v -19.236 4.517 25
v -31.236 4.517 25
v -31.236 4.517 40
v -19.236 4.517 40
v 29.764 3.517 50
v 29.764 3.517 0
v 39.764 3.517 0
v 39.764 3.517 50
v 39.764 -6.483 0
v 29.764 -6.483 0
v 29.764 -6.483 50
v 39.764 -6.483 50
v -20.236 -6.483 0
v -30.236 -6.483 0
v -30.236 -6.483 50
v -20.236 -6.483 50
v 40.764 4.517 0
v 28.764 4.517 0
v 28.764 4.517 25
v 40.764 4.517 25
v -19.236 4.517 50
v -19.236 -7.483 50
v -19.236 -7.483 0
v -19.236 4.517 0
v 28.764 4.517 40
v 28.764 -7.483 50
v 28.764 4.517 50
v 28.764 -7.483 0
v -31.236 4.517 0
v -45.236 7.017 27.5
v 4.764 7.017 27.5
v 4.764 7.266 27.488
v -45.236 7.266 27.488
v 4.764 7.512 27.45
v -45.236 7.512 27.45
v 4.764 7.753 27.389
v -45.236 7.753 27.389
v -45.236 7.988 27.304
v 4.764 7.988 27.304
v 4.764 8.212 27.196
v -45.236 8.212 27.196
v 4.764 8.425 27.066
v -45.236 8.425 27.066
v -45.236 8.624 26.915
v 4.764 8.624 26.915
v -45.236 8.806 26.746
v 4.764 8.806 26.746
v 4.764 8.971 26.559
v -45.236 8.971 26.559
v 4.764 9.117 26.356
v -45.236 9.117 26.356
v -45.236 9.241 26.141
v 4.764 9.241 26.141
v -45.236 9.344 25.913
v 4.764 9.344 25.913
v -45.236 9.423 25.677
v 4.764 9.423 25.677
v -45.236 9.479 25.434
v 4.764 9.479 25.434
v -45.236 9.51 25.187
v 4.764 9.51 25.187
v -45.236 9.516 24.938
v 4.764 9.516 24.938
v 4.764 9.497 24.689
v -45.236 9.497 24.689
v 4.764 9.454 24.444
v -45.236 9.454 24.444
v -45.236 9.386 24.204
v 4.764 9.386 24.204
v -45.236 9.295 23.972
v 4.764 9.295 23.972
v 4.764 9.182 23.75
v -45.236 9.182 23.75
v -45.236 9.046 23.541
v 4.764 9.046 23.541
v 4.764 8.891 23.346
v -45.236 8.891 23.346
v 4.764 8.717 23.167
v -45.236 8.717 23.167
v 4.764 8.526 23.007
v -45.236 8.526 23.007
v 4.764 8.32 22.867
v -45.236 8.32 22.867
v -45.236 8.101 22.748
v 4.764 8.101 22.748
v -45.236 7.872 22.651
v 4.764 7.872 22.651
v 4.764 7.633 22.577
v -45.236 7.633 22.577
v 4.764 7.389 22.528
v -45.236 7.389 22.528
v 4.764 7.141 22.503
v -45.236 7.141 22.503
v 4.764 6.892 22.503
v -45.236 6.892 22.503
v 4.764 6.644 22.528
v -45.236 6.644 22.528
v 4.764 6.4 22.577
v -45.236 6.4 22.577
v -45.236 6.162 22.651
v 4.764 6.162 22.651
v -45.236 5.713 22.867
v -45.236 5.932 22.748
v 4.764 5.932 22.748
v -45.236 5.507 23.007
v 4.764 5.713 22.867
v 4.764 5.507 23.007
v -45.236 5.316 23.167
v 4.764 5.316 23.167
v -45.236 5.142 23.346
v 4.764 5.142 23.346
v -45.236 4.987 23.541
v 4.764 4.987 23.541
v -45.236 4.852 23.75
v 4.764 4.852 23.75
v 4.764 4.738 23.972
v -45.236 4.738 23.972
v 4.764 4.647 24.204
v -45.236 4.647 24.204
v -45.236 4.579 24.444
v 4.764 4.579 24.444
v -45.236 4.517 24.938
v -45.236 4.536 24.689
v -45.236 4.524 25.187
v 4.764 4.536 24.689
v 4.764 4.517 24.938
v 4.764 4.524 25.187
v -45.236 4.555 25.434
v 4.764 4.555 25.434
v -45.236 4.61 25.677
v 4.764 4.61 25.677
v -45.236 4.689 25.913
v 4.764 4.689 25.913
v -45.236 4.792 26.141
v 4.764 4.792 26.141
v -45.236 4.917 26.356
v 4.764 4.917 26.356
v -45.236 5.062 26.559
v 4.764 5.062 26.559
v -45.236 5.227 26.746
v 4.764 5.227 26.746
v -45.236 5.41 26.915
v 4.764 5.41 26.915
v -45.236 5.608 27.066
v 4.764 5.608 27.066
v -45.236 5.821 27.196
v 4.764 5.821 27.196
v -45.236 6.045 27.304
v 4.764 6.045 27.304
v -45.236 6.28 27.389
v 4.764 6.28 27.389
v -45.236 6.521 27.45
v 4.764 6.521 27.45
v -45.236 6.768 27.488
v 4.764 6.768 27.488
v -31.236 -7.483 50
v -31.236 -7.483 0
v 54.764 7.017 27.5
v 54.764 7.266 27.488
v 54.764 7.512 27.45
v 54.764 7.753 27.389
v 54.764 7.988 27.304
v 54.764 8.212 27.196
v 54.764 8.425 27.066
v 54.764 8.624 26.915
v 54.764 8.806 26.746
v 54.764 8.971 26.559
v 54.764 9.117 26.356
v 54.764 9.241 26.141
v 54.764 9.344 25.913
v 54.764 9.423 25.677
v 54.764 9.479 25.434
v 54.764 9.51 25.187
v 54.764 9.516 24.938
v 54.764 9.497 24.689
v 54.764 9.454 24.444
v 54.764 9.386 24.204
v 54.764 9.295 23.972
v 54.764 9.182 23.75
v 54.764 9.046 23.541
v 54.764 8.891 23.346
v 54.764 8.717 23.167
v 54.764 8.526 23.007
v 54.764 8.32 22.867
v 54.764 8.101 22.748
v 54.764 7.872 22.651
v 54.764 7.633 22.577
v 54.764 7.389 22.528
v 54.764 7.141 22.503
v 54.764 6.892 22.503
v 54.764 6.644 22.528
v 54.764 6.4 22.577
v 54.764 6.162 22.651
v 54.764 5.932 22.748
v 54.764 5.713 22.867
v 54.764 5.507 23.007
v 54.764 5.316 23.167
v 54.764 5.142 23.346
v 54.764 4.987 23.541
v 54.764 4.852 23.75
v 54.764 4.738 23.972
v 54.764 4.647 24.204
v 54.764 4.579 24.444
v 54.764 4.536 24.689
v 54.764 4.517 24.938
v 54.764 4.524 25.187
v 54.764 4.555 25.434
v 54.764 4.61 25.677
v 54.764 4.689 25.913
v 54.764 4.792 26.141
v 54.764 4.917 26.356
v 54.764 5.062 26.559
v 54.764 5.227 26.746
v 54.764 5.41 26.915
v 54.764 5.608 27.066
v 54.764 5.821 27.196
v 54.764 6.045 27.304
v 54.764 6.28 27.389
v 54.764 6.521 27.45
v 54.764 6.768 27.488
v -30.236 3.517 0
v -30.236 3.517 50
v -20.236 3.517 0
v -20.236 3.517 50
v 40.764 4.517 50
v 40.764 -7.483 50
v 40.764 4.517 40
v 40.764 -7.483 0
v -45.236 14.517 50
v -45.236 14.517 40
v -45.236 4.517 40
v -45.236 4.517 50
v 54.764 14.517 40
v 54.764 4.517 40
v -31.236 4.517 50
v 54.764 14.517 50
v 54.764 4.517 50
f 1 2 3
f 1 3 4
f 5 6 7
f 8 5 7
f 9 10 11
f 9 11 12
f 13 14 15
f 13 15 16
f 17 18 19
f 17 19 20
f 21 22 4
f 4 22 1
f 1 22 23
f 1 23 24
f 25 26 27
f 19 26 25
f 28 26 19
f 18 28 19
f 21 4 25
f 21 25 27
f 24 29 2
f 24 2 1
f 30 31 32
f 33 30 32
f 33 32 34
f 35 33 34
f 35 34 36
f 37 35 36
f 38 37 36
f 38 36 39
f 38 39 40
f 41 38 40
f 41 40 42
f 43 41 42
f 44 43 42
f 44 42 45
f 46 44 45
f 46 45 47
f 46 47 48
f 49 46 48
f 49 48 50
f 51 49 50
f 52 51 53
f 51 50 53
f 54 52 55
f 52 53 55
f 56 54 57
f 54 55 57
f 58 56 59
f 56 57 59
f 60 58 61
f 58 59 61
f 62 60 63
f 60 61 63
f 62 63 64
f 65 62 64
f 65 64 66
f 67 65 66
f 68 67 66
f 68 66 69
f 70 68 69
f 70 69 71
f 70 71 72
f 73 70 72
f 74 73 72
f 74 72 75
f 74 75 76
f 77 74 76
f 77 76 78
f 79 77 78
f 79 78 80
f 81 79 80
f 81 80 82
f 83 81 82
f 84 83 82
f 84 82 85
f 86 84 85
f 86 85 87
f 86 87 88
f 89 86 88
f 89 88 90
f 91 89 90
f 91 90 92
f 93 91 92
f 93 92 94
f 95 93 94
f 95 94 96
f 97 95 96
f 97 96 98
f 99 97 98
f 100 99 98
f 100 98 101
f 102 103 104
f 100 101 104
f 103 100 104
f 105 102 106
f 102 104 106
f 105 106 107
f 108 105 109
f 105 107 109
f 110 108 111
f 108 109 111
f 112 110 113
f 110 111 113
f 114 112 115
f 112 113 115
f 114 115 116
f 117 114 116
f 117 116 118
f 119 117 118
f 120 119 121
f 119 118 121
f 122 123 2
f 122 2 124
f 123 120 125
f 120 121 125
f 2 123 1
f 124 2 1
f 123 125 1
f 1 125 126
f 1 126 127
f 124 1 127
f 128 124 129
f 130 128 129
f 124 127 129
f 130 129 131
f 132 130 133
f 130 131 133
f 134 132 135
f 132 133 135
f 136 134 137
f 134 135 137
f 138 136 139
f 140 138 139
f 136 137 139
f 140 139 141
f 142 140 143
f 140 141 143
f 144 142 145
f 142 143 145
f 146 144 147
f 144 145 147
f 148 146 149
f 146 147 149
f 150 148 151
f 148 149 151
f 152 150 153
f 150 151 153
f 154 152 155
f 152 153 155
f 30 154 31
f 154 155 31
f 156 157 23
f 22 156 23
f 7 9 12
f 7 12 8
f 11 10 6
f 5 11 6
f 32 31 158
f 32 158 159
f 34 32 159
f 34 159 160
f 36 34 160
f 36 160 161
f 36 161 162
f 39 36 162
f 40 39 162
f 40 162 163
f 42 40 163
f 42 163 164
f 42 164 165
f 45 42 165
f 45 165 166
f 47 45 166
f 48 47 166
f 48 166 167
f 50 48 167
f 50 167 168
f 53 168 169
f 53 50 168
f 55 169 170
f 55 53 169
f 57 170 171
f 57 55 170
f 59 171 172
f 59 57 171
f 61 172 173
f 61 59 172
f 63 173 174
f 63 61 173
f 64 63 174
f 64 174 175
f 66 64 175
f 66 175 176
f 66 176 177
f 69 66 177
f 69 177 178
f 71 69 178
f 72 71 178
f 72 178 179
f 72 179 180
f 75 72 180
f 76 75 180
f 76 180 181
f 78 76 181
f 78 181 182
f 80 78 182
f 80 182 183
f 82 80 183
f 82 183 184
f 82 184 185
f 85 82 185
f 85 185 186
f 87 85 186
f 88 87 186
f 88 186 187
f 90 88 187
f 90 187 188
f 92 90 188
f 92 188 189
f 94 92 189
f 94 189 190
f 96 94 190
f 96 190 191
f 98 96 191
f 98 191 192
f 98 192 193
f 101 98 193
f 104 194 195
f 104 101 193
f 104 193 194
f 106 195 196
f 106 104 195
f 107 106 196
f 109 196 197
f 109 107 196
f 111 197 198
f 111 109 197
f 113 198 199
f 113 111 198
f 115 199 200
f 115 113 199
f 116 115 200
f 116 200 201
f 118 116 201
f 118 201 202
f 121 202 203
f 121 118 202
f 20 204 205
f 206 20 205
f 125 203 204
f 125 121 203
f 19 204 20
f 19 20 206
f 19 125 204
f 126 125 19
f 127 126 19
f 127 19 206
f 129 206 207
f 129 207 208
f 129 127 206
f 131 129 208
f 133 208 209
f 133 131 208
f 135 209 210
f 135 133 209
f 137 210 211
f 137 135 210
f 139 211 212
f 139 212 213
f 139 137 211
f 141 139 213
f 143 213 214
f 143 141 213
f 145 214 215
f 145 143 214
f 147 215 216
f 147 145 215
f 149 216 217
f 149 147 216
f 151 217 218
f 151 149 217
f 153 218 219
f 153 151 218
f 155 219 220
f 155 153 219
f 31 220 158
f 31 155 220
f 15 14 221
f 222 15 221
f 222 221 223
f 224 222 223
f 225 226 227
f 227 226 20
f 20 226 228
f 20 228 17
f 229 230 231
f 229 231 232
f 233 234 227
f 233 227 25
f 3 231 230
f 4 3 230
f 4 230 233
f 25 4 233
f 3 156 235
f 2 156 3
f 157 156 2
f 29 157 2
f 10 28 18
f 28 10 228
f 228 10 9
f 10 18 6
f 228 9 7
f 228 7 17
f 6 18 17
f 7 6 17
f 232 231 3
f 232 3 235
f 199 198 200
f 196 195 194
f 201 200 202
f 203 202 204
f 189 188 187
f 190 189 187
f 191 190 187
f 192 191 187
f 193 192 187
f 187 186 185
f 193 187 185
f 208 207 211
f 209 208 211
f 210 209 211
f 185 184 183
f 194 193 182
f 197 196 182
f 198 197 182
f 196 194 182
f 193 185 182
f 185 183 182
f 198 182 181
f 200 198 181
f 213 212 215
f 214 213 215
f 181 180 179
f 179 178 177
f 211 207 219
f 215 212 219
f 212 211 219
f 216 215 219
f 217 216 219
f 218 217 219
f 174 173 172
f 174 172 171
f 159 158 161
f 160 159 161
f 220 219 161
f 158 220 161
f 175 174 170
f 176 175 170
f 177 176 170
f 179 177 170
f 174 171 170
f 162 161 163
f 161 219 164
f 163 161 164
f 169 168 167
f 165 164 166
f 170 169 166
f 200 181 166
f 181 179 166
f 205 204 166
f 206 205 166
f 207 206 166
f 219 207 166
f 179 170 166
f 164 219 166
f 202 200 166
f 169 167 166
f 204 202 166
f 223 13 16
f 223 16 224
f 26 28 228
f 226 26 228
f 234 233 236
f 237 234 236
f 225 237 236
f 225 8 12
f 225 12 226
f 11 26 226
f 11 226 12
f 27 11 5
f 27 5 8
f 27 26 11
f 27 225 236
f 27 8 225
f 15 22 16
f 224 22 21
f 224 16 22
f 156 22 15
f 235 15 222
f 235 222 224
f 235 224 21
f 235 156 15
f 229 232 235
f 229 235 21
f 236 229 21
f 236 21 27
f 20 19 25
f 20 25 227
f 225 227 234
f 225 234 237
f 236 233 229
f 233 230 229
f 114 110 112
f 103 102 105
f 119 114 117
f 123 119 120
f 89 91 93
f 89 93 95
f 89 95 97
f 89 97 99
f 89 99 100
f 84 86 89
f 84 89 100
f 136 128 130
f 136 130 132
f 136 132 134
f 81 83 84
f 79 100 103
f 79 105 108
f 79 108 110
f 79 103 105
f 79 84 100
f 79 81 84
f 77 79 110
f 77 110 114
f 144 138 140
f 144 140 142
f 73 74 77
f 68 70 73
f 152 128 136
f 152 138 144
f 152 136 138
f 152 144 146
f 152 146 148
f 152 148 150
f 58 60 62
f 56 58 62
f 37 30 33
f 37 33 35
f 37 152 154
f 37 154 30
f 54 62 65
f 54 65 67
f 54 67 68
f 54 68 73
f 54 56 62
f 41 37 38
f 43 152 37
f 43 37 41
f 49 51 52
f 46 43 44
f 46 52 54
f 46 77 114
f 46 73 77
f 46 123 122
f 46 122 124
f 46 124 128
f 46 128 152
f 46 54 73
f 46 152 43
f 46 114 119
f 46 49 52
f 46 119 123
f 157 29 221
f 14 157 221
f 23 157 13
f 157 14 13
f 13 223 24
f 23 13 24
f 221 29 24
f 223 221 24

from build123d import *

# Parameters (mm, degrees)
SKETCH1_W             = 12
SKETCH1_H             = 12
SKETCH1_W_2           = 10
SKETCH1_H_2           = 10
BOSS_EXTRUDE1_DEPTH   = 50
BOSS_EXTRUDE1_2_DEPTH = 50
SKETCH2_R             = 2.5
SKETCH2_W             = 10
SKETCH2_H             = 10
BOSS_EXTRUDE2_DEPTH   = 50


with BuildPart() as part:
    # Sketch1 → Boss-Extrude1 (new body)
    with BuildSketch(Plane.XY):
        with Locations((-25.236114275, -1.483415253)):
            Rectangle(SKETCH1_W, SKETCH1_H)
        with Locations((-25.236114275, -1.483415253)):
            Rectangle(SKETCH1_W_2, SKETCH1_H_2, mode=Mode.SUBTRACT)
    extrude(amount=BOSS_EXTRUDE1_DEPTH)



with BuildPart() as body_2:
    # Sketch1 → Boss-Extrude1 2 (new body)
    with BuildSketch(Plane.XY):
        with Locations((34.763885725, -1.483415253)):
            Rectangle(SKETCH1_W, SKETCH1_H)
        with Locations((34.763885725, -1.483415253)):
            Rectangle(SKETCH1_W_2, SKETCH1_H_2, mode=Mode.SUBTRACT)
    extrude(amount=BOSS_EXTRUDE1_2_DEPTH)


with BuildPart() as part_1:
    add(part.part)

    add(body_2.part)  # Boss-Extrude2 merges body 2
    # Sketch2 → Boss-Extrude2 (add, symmetric)
    with BuildSketch(Plane.ZY.offset(-4.763885725)):
        with Locations((25, 7.016584747)):
            Circle(SKETCH2_R)
        with Locations((45, 9.516584747)):
            Rectangle(SKETCH2_W, SKETCH2_H)
    extrude(amount=BOSS_EXTRUDE2_DEPTH, both=True)


solid = part_1.part
